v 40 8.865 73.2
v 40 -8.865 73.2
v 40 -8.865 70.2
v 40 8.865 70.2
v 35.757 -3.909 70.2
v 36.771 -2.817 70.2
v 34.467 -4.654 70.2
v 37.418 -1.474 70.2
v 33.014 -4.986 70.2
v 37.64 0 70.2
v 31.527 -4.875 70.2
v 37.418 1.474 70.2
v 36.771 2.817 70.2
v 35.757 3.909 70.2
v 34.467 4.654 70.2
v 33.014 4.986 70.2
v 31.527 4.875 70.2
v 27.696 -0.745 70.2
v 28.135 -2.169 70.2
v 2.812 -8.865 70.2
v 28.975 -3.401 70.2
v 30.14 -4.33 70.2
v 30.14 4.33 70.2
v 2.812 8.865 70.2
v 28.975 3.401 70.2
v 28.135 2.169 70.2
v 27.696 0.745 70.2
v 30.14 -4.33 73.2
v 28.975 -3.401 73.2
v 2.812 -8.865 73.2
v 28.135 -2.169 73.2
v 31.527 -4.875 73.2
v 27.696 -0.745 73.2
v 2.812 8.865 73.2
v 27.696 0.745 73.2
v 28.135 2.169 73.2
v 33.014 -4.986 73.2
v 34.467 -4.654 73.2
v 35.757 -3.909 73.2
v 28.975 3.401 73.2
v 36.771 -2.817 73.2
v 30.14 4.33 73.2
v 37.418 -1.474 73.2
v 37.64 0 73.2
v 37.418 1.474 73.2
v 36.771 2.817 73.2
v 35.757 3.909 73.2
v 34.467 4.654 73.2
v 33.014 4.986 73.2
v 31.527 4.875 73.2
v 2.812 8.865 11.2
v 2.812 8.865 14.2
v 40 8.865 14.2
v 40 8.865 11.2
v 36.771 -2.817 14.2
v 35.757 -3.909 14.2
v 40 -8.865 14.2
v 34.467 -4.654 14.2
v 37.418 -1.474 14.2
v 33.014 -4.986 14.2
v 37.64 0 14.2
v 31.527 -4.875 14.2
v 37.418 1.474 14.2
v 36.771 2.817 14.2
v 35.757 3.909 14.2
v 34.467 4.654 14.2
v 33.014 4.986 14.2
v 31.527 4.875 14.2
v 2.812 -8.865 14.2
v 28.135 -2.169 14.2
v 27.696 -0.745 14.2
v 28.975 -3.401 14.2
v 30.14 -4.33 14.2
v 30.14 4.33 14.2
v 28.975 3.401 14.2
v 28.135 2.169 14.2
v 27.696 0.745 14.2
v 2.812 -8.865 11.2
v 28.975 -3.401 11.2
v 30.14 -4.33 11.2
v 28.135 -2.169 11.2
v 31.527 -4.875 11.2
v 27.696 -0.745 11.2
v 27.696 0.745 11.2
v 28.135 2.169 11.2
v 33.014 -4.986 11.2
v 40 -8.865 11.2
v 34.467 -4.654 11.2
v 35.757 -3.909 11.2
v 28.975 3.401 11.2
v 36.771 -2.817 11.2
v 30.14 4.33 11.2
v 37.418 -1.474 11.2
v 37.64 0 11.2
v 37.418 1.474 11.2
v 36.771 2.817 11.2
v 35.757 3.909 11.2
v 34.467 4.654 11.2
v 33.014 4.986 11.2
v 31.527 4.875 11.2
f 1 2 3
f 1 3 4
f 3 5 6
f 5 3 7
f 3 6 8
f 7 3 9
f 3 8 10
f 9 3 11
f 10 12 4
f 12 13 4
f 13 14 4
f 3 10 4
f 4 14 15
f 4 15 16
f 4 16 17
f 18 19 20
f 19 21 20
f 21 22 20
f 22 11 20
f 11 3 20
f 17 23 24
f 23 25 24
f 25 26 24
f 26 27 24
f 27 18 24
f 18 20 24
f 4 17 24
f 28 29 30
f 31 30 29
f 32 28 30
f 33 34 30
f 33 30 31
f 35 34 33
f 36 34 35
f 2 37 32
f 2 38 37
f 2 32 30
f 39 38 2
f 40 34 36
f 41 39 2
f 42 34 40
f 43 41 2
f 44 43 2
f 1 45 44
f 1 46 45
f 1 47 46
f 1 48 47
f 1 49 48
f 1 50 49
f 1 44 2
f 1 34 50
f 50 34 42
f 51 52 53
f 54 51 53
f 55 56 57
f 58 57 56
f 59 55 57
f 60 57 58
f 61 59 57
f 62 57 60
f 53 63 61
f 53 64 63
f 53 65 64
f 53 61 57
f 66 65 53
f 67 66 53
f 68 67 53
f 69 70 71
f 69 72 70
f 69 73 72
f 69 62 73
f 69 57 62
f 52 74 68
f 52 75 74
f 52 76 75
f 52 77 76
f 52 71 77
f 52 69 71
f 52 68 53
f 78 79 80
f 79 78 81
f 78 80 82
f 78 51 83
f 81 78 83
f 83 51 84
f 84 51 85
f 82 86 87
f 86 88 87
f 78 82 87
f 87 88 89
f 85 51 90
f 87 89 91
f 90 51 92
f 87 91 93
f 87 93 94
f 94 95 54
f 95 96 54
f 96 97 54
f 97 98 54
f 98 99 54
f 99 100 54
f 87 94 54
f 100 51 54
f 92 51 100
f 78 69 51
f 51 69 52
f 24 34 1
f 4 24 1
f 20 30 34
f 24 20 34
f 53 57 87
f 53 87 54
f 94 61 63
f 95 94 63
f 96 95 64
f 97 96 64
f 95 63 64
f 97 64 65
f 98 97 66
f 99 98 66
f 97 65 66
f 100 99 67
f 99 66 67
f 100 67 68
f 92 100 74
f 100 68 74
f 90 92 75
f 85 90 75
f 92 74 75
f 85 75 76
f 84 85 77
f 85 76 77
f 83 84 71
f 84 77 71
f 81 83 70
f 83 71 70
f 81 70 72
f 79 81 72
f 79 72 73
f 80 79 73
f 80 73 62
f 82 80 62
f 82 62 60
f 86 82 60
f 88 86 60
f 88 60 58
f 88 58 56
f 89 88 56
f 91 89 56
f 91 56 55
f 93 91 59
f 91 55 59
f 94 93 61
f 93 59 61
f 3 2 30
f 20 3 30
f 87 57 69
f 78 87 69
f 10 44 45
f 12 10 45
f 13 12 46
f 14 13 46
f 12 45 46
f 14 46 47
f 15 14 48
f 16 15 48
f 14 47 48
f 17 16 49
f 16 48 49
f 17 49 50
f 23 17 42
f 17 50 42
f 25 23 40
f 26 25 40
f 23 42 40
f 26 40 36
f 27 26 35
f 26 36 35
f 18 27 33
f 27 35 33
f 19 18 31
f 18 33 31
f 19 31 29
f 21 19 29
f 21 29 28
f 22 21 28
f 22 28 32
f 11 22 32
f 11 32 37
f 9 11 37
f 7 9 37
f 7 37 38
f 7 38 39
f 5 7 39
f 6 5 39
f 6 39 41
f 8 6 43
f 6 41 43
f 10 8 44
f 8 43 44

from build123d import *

# Parameters (mm, degrees)
SKETCH_1_R             = 2.5
EXTRUDE_1_DEPTH        = 88.2
SKETCH_2_R             = 12.5
EXTRUDE_2_DEPTH        = 62
SKETCH_3_W             = 40
SKETCH_3_H             = 17.730441408
SKETCH_3_R             = 5
EXTRUDE_3_DEPTH        = 3
PATTERN_LINEAR_1_COUNT = 2
PATTERN_LINEAR_1_PITCH = 59
SKETCH_5_R             = 2.5
CUT_EXTRUDE_2_DEPTH    = 85.347436238
SKETCH_6_R             = 2.5
CUT_EXTRUDE_3_DEPTH    = 88.2215119
SKETCH_7_W             = 56
SKETCH_7_H             = 17.730441408
CUT_EXTRUDE_4_DEPTH    = 83.581789618


with BuildPart() as part:
    # 草图1 → 凸台-拉伸1 (new body)
    with BuildSketch(Plane.XY):
        Circle(SKETCH_1_R)
    extrude(amount=EXTRUDE_1_DEPTH)

    # 草图2 → 凸台-拉伸2 (add)
    with BuildSketch(Plane.XY.offset(73.2)):
        Circle(SKETCH_2_R)
    extrude(amount=-EXTRUDE_2_DEPTH)

    # 草图3 → 凸台-拉伸3 (add)
    with BuildSketch(Plane.XY.offset(73.2)):
        with Locations((20, 0)):
            Rectangle(SKETCH_3_W, SKETCH_3_H)
        with Locations((32.640039451, 0)):
            Circle(SKETCH_3_R, mode=Mode.SUBTRACT)
    extrude_3 = extrude(amount=-EXTRUDE_3_DEPTH)

    # 阵列(线性)1: 凸台-拉伸3 ×2
    with Locations(*[(0, 0, -i * PATTERN_LINEAR_1_PITCH) for i in range(1, PATTERN_LINEAR_1_COUNT)]):
        add(extrude_3)

    # 草图5 → 切除-拉伸2 (cut, through all)
    # profile 1 of 2: a face of its own
    with BuildSketch(Plane.XY.offset(73.2)):
        with BuildLine():
            Line((2.812369821, -8.865220704), (2.812369821, 8.865220704))
            Line((2.812369821, 8.865220704), (8.812369821, 8.865220704))
            ThreePointArc((8.812369821, 8.865220704), (-12.5, 0), (8.812369821, -8.865220704))
            Line((8.812369821, -8.865220704), (2.812369821, -8.865220704))
        make_face()
        Circle(SKETCH_5_R, mode=Mode.SUBTRACT)
    # profile 2 of 2: a face of its own
    with BuildSketch(Plane.XY.offset(73.2)):
        Circle(SKETCH_5_R)
    extrude(amount=-CUT_EXTRUDE_2_DEPTH, mode=Mode.SUBTRACT)


with BuildPart() as cut_extrude_2_piece_1:
    # of the separate pieces the step leaves, piece 1, a body of its own (cut_extrude_2_pieces)
    add(part.part.solids().sort_by_distance((40, -8.865220704, 11.2))[0])

    # 草图7 → 切除-拉伸4 (cut, through all)
    with BuildSketch(Plane.ZY.offset(-2.812369821)):
        with Locations((42.2, 0)):
            Rectangle(SKETCH_7_W, SKETCH_7_H)
    extrude(amount=-CUT_EXTRUDE_4_DEPTH, mode=Mode.SUBTRACT)


with BuildPart() as cut_extrude_2_piece_2:
    # of the separate pieces the step leaves, piece 2, a body of its own (cut_extrude_2_pieces)
    add(part.part.solids().sort_by_distance((2.5, 0, 73.2))[0])

    # 草图6 → 切除-拉伸3 (cut, through all)
    with BuildSketch(Plane.XY.offset(88.2)):
        Circle(SKETCH_6_R)
    extrude(amount=-CUT_EXTRUDE_3_DEPTH, mode=Mode.SUBTRACT)


with BuildPart() as cut_extrude_4_piece_1:
    # of the separate pieces the step leaves, piece 1, a body of its own (cut_extrude_4_pieces)
    add(cut_extrude_2_piece_1.part.solids().sort_by_distance((2.812369821, 8.865220704, 73.2))[0])


with BuildPart() as cut_extrude_4_piece_2:
    # of the separate pieces the step leaves, piece 2, a body of its own (cut_extrude_4_pieces)
    add(cut_extrude_2_piece_1.part.solids().sort_by_distance((40, -8.865220704, 11.2))[0])


solid = Compound([cut_extrude_4_piece_1.part, cut_extrude_4_piece_2.part])
